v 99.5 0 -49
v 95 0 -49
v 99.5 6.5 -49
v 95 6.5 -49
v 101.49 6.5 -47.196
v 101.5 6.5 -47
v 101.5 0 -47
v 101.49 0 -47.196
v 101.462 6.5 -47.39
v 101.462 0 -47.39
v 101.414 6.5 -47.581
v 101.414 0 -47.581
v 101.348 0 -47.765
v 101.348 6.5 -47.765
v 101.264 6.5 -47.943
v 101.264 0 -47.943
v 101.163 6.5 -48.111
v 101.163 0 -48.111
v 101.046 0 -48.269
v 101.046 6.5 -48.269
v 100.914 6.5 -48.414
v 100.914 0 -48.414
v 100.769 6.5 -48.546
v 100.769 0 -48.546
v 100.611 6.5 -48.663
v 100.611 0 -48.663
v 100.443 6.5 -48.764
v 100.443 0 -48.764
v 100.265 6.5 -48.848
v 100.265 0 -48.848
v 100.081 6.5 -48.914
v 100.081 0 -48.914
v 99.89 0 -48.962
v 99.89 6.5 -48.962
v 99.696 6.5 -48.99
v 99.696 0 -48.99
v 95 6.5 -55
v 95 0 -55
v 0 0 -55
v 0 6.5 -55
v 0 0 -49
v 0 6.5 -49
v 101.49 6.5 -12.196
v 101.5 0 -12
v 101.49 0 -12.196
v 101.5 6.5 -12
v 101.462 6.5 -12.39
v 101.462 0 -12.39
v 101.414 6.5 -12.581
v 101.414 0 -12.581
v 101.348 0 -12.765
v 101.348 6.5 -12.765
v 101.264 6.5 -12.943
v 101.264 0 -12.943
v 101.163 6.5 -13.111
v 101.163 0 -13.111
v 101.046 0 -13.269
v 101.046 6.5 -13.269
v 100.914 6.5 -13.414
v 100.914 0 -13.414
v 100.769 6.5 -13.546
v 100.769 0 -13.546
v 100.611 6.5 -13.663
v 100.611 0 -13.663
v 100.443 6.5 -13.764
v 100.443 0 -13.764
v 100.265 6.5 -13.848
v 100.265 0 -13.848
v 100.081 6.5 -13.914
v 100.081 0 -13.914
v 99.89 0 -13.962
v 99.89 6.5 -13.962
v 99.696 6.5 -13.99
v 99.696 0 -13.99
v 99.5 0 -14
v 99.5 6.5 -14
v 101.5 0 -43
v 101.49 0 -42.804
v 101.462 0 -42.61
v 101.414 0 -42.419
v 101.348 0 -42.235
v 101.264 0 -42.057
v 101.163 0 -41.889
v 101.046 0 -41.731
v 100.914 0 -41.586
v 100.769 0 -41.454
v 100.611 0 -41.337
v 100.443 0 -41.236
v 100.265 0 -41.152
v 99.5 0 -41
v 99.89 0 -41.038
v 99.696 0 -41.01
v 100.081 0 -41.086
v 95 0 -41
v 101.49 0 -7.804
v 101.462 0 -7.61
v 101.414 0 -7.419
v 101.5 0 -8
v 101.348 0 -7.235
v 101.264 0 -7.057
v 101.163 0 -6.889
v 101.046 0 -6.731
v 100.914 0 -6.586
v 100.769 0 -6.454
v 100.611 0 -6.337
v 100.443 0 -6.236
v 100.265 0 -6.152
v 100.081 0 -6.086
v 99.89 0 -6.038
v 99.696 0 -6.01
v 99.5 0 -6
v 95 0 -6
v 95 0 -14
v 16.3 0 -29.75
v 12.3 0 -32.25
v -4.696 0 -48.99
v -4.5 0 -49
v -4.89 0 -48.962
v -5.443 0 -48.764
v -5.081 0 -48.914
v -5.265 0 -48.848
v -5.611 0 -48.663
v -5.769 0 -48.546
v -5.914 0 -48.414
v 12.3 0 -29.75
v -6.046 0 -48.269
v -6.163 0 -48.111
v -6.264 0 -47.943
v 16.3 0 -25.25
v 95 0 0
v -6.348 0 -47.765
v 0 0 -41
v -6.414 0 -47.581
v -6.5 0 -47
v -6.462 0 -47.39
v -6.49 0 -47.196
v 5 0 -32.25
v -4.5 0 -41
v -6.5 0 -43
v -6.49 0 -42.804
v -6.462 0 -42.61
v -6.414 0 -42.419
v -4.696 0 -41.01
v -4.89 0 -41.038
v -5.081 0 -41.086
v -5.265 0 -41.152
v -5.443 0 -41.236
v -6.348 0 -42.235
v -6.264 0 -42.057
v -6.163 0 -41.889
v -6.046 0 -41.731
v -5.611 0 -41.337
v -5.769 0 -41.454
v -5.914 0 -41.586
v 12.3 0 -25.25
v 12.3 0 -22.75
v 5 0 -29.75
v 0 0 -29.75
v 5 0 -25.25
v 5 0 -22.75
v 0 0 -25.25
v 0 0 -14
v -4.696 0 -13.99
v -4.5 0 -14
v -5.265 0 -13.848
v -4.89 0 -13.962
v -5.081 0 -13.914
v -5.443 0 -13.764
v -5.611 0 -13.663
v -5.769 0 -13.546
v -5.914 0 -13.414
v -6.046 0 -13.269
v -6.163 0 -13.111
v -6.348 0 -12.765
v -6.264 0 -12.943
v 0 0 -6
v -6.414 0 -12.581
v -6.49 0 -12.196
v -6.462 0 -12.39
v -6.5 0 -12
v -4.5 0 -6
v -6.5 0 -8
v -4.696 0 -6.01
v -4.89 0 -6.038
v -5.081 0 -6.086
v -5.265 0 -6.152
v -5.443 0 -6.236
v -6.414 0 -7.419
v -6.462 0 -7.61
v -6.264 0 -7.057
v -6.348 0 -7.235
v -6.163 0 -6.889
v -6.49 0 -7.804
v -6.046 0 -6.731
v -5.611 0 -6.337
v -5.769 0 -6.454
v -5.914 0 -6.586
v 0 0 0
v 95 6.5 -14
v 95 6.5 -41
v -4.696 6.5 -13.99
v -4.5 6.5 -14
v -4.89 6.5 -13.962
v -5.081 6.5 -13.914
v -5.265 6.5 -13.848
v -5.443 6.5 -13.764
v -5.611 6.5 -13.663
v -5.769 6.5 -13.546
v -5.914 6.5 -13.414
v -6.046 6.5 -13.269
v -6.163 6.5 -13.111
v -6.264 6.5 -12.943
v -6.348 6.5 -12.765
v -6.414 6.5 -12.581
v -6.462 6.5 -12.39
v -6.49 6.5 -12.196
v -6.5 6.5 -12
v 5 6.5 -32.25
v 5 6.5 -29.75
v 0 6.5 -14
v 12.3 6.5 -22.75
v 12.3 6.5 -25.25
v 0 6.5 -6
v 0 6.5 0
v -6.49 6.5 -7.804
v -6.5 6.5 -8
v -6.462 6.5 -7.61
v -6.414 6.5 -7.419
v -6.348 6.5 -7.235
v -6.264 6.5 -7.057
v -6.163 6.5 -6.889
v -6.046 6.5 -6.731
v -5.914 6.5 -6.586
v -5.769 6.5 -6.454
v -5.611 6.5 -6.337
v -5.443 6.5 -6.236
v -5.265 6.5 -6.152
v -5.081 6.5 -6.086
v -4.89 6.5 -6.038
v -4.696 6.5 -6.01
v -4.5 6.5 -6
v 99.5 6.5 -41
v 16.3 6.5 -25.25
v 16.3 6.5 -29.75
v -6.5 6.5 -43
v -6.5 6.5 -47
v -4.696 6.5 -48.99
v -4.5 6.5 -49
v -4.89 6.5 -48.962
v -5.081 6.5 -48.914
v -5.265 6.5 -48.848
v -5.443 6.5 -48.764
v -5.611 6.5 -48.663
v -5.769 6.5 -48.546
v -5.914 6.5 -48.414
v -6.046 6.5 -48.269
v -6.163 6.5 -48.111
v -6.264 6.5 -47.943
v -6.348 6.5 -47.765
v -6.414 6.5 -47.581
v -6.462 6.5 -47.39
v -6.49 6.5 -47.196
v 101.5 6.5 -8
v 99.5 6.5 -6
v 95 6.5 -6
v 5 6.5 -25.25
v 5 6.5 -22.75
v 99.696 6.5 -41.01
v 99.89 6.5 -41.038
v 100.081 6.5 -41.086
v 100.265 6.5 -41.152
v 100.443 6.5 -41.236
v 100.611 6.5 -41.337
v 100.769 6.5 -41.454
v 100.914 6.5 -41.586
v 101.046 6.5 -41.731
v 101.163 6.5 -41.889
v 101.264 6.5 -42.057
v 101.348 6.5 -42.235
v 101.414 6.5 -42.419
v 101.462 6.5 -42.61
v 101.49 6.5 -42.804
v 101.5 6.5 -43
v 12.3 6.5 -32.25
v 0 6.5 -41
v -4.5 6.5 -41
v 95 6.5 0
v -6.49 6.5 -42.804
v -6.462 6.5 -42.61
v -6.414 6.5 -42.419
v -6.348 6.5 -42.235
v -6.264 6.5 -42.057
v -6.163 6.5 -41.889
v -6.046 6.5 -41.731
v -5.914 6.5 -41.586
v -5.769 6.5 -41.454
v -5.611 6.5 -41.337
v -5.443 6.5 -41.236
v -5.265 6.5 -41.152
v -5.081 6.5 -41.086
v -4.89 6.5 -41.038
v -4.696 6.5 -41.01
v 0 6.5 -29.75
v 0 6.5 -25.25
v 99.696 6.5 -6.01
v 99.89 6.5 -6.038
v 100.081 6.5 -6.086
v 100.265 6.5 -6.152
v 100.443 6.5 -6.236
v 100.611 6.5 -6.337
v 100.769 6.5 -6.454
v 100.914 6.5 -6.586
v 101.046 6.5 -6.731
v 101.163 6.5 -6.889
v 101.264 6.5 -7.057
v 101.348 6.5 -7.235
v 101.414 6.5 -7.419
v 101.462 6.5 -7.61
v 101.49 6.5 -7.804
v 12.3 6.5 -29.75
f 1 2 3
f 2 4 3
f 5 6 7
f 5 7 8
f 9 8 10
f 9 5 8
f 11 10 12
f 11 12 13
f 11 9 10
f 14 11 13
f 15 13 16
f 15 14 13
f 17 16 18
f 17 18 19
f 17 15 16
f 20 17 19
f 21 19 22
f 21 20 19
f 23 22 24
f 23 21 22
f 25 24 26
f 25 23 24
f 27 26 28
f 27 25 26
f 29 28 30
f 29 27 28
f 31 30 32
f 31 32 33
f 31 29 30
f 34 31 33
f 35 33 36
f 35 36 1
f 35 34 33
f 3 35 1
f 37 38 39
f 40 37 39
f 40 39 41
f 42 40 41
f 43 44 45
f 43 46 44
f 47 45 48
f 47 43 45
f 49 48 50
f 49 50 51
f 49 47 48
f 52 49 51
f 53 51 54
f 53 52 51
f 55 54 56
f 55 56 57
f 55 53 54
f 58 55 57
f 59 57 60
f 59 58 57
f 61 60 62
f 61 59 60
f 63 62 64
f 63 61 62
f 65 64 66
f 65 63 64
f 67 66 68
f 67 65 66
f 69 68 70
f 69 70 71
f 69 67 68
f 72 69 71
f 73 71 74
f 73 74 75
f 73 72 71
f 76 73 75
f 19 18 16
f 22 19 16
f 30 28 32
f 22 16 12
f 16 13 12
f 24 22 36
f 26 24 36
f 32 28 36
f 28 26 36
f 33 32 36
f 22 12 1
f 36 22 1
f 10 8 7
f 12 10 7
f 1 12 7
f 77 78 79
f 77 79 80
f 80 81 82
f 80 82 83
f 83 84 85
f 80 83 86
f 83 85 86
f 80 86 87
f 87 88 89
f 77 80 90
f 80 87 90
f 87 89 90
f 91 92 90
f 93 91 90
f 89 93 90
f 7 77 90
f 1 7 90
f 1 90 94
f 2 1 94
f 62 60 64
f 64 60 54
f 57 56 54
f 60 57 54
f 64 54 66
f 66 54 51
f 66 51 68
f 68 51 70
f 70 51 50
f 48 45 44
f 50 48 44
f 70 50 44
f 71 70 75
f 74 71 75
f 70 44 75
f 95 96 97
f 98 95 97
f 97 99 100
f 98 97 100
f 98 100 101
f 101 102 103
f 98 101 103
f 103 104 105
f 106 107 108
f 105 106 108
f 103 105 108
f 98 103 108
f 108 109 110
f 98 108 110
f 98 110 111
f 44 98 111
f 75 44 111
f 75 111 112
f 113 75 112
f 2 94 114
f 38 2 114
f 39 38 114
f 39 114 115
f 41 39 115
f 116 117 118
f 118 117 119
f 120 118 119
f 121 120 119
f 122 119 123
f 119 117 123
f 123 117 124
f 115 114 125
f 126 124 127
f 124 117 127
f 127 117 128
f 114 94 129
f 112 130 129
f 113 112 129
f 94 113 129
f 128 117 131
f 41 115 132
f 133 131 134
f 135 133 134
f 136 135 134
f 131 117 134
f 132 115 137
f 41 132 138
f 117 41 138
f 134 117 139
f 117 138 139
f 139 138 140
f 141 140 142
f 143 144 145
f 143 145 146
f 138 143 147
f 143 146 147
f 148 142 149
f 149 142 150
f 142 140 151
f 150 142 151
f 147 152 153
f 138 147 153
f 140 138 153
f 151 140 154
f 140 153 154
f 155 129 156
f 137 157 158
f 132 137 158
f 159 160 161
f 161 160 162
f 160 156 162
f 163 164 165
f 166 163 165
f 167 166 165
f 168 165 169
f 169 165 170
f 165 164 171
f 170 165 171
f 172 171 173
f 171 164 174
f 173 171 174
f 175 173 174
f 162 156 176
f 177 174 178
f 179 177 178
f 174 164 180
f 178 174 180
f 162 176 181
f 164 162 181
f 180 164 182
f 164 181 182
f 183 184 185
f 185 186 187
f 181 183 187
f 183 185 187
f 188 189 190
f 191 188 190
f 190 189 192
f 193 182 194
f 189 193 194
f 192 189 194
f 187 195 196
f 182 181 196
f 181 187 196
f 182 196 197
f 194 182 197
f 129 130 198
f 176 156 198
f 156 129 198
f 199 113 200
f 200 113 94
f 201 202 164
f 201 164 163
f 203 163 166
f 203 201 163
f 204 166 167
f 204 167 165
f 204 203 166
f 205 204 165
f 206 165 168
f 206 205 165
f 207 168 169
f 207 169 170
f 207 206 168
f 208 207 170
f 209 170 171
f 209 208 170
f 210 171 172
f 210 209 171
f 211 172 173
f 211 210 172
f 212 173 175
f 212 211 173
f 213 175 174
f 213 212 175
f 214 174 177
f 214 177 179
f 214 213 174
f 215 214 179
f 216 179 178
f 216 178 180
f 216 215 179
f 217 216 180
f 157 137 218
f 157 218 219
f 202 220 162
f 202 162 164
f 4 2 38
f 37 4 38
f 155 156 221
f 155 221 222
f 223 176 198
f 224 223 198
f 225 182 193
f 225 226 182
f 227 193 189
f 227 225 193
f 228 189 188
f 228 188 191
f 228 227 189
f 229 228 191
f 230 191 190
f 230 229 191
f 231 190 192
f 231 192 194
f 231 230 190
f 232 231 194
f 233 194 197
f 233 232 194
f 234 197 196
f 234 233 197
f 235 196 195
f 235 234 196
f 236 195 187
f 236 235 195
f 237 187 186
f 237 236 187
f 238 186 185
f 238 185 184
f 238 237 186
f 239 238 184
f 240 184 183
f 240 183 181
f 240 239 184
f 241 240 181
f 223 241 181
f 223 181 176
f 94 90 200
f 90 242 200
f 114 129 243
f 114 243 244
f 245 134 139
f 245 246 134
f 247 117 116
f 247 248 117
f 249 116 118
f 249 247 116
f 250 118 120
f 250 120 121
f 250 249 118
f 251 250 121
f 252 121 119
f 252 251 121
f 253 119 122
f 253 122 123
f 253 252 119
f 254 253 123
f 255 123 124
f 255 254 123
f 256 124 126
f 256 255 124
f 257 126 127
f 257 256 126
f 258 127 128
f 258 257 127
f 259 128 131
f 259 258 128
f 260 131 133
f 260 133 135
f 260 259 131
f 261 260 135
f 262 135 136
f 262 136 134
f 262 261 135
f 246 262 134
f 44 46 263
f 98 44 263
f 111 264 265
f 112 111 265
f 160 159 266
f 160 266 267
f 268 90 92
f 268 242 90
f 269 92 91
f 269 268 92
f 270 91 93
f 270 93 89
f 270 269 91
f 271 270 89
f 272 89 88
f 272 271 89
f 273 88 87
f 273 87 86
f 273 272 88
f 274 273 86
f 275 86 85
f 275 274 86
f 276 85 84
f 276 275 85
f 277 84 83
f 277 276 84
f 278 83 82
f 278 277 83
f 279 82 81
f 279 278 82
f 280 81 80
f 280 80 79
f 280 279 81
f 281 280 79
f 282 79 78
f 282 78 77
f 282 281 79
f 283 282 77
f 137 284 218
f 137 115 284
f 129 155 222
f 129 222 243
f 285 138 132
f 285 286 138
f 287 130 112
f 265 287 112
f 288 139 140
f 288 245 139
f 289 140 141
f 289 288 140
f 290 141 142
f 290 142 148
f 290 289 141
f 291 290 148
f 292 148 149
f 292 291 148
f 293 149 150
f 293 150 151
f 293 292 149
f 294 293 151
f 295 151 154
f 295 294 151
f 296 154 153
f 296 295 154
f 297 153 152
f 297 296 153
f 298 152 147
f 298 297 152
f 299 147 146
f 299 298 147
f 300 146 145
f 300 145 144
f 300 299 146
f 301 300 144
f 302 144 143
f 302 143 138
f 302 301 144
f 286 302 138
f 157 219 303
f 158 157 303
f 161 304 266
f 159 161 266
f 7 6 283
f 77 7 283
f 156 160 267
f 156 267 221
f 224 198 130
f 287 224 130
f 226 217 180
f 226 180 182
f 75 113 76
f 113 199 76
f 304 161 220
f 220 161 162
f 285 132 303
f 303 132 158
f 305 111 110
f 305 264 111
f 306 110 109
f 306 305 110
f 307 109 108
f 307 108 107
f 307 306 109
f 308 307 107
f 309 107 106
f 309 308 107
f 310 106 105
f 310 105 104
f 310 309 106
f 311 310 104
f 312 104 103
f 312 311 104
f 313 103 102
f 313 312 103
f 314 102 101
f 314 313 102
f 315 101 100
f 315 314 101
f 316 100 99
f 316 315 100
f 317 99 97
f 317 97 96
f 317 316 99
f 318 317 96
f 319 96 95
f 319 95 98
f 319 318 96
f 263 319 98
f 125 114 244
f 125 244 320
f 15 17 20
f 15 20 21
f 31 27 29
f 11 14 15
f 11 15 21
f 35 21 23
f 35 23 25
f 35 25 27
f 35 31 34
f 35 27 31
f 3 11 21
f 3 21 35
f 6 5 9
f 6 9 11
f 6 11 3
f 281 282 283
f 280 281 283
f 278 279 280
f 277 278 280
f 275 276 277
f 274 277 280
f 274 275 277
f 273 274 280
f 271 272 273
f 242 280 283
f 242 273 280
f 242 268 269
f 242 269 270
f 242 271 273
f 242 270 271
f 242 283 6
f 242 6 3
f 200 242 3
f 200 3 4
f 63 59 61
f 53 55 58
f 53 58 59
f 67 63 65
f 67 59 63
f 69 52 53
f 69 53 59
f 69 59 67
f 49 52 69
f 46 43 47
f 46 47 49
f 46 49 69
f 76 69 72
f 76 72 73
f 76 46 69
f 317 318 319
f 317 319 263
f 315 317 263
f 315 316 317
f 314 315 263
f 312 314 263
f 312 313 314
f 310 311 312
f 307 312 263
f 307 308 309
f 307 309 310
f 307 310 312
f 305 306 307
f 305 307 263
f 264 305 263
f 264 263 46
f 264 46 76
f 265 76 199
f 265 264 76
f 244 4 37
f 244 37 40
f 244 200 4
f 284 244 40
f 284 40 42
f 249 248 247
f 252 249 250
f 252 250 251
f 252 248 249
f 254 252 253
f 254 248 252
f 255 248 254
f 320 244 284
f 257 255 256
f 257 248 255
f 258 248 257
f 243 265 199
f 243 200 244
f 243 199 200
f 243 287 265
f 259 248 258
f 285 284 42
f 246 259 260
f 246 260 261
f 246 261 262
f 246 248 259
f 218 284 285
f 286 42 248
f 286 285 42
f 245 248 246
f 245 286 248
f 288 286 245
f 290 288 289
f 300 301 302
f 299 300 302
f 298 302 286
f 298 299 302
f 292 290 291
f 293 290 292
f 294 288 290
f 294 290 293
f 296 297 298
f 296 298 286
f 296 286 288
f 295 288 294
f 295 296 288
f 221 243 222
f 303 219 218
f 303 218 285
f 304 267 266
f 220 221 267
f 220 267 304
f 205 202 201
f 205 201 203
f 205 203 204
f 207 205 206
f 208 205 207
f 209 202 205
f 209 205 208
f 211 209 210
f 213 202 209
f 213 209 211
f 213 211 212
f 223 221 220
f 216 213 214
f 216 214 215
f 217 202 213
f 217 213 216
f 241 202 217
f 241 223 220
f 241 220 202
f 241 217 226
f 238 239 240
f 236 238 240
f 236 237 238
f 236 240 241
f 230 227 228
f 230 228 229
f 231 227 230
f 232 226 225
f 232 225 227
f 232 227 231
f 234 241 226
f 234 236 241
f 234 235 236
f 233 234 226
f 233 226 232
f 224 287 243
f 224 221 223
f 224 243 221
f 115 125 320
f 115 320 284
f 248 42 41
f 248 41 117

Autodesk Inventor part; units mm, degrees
ref_plane "YZ Plane" through (0, 0, 0) normal (1, 0, 0) x (0, 1, 0)
ref_plane "XZ Plane" through (0, 0, 0) normal (0, 1, 0) x (-1, 0, 0)
ref_plane "XY Plane" through (0, 0, 0) normal (0, 0, 1) x (1, 0, 0)
sketch "Sketch1" plane through (0, 0, 0) normal (0, 1, 0) x (-1, 0, 0)
  line L0 (0, 0) -> (-95, 0)
  line L1 (-95, 0) -> (-95, -55)
  line L2 (-95, -55) -> (0, -55)
  line L3 (0, -55) -> (0, 0)
  dimension "d0" = 55
  dimension "d1" = 95
extrude "Extrusion1" add sketch "Sketch1" along normal blind 6.5
sketch "Sketch3" plane through (0, 6.5, 0) normal (0, 1, 0) x (1, 0, 0)
  line L0 (0, 0) -> (95, 0) projected
  line L1 (95, 55) -> (0, 55) projected
  line L2 (0, 55) -> (0, 0) projected
  line L3 (0, 49) -> (-4.5, 49)
  line L4 (-6.5, 47) -> (-6.5, 43)
  line L5 (-4.5, 41) -> (0, 41)
  line L6 (0, 41) -> (0, 49)
  line L7 (47.5, 55) -> (47.5, 0) construction
  line L8 (0, 14) -> (-4.5, 14)
  line L9 (-6.5, 12) -> (-6.5, 8)
  line L10 (-4.5, 6) -> (0, 6)
  line L11 (0, 6) -> (0, 14)
  arc A0 (-4.5, 49) -> (-6.5, 47) centre (-4.5, 47) ccw
  arc A1 (-6.5, 43) -> (-4.5, 41) centre (-4.5, 43) ccw
  arc A2 (-4.5, 14) -> (-6.5, 12) centre (-4.5, 12) ccw
  arc A3 (-6.5, 8) -> (-4.5, 6) centre (-4.5, 8) ccw
  line L12 (95, 49) -> (99.5, 49)
  line L13 (101.5, 47) -> (101.5, 43)
  line L14 (99.5, 41) -> (95, 41)
  line L15 (95, 41) -> (95, 49)
  line L16 (95, 14) -> (99.5, 14)
  line L17 (101.5, 12) -> (101.5, 8)
  line L18 (99.5, 6) -> (95, 6)
  line L19 (95, 6) -> (95, 14)
  arc A4 (101.5, 47) -> (99.5, 49) centre (99.5, 47) ccw
  arc A5 (99.5, 41) -> (101.5, 43) centre (99.5, 43) ccw
  arc A6 (101.5, 12) -> (99.5, 14) centre (99.5, 12) ccw
  arc A7 (99.5, 6) -> (101.5, 8) centre (99.5, 8) ccw
  dimension "d13" = 2
  dimension "d14" = 8
  dimension "d15" = 8
  dimension "d16" = 6.5
  dimension "d17" = 6
  dimension "d18" = 6
extrude "Extrusion3" add sketch "Sketch3" against normal blind 6.5
sketch "Sketch4" plane through (0, 0, 0) normal (0, -1, 0) x (1, 0, 0)
  line L0 (0, -41) -> (0, -14) projected
  line L1 (16.3, -25.25) -> (16.3, -29.75)
  line L2 (0, -29.75) -> (0, -25.25)
  line L3 (5, -22.75) -> (12.3, -22.75)
  line L4 (12.3, -32.25) -> (5, -32.25)
  line L5 (0, -25.25) -> (5, -25.25)
  line L6 (12.3, -25.25) -> (16.3, -25.25)
  line L7 (16.3, -29.75) -> (12.3, -29.75)
  line L8 (5, -29.75) -> (0, -29.75)
  line L9 (5, -32.25) -> (5, -29.75)
  line L10 (5, -25.25) -> (5, -22.75)
  line L11 (12.3, -22.75) -> (12.3, -25.25)
  line L12 (12.3, -29.75) -> (12.3, -32.25)
  point P0 (0, -27.5)
  dimension "d21" = 4.5
  dimension "d22" = 5
  dimension "d23" = 4
  dimension "d24" = 7.3
  dimension "d25" = 2.5
extrude "Extrusion4" cut sketch "Sketch4" against normal through all
equation "\"d18\" = d17"
properties part number "spool_brace" material "Plywood, Finish"
